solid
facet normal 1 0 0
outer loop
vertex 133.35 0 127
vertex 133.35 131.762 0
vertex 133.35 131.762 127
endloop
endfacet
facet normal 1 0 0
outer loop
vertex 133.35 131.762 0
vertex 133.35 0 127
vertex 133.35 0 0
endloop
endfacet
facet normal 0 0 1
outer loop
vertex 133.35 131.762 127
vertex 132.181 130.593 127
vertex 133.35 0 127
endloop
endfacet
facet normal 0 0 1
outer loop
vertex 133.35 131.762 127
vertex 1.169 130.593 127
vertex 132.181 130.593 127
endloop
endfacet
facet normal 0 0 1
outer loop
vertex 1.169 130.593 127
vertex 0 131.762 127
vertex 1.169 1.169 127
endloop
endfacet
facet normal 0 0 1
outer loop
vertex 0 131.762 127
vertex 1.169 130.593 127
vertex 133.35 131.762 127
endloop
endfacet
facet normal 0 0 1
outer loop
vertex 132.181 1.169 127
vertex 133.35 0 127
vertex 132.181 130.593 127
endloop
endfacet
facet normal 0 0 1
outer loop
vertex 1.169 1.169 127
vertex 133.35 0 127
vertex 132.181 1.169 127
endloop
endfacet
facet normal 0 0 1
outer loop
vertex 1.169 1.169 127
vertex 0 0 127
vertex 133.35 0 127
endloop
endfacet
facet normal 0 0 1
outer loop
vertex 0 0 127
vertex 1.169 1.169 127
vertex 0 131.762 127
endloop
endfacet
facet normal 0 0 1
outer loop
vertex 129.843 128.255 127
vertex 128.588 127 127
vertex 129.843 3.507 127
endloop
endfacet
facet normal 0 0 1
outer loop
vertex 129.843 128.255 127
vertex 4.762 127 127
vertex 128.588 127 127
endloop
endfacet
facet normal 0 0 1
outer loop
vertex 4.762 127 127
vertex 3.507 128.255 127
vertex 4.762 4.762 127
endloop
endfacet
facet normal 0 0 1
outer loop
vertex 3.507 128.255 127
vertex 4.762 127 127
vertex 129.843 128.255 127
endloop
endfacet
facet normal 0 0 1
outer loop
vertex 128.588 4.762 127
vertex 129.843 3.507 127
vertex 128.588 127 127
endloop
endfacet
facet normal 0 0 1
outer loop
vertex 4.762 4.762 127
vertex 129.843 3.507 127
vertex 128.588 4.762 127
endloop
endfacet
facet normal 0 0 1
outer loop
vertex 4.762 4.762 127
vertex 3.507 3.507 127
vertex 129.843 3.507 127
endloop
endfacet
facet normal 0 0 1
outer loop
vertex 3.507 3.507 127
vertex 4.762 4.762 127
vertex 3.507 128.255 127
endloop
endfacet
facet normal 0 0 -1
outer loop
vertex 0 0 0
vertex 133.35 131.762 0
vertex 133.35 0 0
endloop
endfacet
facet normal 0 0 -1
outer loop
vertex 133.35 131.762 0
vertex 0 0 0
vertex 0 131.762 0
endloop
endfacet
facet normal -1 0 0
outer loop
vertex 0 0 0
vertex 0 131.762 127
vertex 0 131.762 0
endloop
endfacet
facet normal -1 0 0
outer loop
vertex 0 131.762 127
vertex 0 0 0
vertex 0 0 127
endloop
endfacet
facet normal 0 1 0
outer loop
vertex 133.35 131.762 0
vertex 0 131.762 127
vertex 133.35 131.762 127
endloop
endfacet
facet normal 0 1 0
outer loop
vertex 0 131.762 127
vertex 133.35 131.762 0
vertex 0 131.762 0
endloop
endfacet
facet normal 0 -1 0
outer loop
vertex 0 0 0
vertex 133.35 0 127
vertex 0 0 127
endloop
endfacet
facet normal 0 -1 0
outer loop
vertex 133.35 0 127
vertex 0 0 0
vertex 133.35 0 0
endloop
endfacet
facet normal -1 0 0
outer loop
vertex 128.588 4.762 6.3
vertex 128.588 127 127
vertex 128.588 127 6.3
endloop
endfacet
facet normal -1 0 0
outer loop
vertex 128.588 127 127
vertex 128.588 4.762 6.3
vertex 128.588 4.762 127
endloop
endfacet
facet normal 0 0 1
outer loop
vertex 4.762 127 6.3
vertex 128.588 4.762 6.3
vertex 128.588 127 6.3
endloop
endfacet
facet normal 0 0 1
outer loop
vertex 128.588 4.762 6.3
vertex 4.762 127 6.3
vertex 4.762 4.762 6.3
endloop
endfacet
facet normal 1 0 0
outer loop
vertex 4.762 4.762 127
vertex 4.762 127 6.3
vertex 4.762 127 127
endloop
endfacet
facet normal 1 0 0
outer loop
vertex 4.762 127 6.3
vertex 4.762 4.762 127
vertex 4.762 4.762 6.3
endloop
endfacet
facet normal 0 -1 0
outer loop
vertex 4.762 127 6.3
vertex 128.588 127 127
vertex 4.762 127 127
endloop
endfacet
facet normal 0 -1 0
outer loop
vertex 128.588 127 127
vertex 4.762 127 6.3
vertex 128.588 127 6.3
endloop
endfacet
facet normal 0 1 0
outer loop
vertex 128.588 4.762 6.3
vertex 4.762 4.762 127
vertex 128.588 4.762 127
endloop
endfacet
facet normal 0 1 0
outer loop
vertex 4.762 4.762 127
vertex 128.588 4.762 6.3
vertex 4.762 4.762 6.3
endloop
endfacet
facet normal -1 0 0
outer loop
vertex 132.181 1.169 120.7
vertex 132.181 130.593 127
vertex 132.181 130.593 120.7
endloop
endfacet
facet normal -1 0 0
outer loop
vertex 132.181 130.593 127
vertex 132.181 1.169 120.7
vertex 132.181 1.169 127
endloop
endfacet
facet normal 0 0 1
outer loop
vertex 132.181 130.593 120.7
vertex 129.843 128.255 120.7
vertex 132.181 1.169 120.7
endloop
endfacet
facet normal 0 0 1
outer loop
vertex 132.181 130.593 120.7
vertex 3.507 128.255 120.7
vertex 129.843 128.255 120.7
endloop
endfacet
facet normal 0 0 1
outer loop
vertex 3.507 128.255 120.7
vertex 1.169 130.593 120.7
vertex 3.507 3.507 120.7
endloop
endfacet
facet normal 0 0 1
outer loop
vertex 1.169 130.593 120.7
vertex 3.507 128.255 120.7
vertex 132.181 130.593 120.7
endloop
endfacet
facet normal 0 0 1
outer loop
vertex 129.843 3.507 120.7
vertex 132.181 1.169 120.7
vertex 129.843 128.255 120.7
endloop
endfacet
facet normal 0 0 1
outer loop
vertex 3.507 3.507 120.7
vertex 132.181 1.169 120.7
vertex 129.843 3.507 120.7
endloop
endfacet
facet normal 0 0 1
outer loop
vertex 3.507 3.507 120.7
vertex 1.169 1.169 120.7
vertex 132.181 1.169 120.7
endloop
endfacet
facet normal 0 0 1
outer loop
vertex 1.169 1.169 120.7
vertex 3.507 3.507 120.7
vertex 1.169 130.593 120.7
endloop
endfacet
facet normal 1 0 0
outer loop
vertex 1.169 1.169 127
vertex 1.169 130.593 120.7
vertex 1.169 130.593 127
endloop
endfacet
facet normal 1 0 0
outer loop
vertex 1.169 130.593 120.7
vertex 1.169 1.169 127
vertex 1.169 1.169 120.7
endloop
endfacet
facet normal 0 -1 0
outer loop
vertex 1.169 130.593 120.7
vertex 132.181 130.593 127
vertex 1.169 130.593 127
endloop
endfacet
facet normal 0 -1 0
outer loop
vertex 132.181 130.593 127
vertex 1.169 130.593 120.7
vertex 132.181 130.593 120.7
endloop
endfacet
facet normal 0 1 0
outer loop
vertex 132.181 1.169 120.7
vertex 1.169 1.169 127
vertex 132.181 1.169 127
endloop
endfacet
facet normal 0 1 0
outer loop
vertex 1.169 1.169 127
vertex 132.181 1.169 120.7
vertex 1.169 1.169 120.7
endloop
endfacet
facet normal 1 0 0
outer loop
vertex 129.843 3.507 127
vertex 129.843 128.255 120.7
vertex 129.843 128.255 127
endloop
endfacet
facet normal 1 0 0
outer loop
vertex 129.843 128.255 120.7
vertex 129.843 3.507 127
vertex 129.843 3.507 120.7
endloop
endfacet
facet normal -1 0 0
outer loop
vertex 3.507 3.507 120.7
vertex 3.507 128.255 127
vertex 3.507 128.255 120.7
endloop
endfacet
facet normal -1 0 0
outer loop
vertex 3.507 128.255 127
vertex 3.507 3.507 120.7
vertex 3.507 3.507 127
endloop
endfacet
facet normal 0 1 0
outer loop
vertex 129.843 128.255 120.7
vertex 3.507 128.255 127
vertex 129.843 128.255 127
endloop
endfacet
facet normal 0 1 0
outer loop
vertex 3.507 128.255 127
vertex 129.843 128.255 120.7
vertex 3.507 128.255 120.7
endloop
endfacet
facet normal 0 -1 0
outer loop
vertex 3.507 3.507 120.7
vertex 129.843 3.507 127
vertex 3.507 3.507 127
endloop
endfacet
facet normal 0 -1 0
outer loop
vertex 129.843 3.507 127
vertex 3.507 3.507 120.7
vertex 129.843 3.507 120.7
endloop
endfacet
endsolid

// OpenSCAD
/* [Model Resolution (All dimensions are in Millimeters)] */
$fn = 256;

/* [Box Container Properties] */
Length = 133.35;
Width = 131.762;
Fit = 0; //.889(.035") is a good fit for most 
Height = 127;  //241.3
Wall_Thickness = 4.762;
Floor_Thickness = 6.3;

Groove_Width = 2.338;
Groove_Depth = 6.3;

difference(){
Outside_Box();
Groove_Box();
}

module Outside_Box(){
  difference()
{   
    // Outside Dimensions
    cube([ 
        Length, 
        Width, 
        Height ],
         center = false);
    // Inside Dimensions
    translate([ 
        Wall_Thickness, 
        Wall_Thickness, 
        Floor_Thickness])
        cube([ 
          Length-Wall_Thickness*2, 
          Width-Wall_Thickness*2, 
          Height], 
          center = false);
    
};
}

module Groove_Box(){
 
// Groove Square
// Outside Dimensions
color("red"){
translate([
    Groove_Width/2,
    Groove_Width/2,
    Height-Groove_Depth,
    ]) {   
difference(){
cube([ 
        Length-Groove_Width, 
        Width-Groove_Width, 
        Groove_Depth+1 
    ],
         center = false
);
//Inside Dimensions
translate([
Groove_Width,
Groove_Width,
-1,
])
cube([
 Length-Groove_Width*3, 
 Width-Groove_Width*3, 
Groove_Depth+3
],
center = false
); 
    
};
 };  
}; 
}
